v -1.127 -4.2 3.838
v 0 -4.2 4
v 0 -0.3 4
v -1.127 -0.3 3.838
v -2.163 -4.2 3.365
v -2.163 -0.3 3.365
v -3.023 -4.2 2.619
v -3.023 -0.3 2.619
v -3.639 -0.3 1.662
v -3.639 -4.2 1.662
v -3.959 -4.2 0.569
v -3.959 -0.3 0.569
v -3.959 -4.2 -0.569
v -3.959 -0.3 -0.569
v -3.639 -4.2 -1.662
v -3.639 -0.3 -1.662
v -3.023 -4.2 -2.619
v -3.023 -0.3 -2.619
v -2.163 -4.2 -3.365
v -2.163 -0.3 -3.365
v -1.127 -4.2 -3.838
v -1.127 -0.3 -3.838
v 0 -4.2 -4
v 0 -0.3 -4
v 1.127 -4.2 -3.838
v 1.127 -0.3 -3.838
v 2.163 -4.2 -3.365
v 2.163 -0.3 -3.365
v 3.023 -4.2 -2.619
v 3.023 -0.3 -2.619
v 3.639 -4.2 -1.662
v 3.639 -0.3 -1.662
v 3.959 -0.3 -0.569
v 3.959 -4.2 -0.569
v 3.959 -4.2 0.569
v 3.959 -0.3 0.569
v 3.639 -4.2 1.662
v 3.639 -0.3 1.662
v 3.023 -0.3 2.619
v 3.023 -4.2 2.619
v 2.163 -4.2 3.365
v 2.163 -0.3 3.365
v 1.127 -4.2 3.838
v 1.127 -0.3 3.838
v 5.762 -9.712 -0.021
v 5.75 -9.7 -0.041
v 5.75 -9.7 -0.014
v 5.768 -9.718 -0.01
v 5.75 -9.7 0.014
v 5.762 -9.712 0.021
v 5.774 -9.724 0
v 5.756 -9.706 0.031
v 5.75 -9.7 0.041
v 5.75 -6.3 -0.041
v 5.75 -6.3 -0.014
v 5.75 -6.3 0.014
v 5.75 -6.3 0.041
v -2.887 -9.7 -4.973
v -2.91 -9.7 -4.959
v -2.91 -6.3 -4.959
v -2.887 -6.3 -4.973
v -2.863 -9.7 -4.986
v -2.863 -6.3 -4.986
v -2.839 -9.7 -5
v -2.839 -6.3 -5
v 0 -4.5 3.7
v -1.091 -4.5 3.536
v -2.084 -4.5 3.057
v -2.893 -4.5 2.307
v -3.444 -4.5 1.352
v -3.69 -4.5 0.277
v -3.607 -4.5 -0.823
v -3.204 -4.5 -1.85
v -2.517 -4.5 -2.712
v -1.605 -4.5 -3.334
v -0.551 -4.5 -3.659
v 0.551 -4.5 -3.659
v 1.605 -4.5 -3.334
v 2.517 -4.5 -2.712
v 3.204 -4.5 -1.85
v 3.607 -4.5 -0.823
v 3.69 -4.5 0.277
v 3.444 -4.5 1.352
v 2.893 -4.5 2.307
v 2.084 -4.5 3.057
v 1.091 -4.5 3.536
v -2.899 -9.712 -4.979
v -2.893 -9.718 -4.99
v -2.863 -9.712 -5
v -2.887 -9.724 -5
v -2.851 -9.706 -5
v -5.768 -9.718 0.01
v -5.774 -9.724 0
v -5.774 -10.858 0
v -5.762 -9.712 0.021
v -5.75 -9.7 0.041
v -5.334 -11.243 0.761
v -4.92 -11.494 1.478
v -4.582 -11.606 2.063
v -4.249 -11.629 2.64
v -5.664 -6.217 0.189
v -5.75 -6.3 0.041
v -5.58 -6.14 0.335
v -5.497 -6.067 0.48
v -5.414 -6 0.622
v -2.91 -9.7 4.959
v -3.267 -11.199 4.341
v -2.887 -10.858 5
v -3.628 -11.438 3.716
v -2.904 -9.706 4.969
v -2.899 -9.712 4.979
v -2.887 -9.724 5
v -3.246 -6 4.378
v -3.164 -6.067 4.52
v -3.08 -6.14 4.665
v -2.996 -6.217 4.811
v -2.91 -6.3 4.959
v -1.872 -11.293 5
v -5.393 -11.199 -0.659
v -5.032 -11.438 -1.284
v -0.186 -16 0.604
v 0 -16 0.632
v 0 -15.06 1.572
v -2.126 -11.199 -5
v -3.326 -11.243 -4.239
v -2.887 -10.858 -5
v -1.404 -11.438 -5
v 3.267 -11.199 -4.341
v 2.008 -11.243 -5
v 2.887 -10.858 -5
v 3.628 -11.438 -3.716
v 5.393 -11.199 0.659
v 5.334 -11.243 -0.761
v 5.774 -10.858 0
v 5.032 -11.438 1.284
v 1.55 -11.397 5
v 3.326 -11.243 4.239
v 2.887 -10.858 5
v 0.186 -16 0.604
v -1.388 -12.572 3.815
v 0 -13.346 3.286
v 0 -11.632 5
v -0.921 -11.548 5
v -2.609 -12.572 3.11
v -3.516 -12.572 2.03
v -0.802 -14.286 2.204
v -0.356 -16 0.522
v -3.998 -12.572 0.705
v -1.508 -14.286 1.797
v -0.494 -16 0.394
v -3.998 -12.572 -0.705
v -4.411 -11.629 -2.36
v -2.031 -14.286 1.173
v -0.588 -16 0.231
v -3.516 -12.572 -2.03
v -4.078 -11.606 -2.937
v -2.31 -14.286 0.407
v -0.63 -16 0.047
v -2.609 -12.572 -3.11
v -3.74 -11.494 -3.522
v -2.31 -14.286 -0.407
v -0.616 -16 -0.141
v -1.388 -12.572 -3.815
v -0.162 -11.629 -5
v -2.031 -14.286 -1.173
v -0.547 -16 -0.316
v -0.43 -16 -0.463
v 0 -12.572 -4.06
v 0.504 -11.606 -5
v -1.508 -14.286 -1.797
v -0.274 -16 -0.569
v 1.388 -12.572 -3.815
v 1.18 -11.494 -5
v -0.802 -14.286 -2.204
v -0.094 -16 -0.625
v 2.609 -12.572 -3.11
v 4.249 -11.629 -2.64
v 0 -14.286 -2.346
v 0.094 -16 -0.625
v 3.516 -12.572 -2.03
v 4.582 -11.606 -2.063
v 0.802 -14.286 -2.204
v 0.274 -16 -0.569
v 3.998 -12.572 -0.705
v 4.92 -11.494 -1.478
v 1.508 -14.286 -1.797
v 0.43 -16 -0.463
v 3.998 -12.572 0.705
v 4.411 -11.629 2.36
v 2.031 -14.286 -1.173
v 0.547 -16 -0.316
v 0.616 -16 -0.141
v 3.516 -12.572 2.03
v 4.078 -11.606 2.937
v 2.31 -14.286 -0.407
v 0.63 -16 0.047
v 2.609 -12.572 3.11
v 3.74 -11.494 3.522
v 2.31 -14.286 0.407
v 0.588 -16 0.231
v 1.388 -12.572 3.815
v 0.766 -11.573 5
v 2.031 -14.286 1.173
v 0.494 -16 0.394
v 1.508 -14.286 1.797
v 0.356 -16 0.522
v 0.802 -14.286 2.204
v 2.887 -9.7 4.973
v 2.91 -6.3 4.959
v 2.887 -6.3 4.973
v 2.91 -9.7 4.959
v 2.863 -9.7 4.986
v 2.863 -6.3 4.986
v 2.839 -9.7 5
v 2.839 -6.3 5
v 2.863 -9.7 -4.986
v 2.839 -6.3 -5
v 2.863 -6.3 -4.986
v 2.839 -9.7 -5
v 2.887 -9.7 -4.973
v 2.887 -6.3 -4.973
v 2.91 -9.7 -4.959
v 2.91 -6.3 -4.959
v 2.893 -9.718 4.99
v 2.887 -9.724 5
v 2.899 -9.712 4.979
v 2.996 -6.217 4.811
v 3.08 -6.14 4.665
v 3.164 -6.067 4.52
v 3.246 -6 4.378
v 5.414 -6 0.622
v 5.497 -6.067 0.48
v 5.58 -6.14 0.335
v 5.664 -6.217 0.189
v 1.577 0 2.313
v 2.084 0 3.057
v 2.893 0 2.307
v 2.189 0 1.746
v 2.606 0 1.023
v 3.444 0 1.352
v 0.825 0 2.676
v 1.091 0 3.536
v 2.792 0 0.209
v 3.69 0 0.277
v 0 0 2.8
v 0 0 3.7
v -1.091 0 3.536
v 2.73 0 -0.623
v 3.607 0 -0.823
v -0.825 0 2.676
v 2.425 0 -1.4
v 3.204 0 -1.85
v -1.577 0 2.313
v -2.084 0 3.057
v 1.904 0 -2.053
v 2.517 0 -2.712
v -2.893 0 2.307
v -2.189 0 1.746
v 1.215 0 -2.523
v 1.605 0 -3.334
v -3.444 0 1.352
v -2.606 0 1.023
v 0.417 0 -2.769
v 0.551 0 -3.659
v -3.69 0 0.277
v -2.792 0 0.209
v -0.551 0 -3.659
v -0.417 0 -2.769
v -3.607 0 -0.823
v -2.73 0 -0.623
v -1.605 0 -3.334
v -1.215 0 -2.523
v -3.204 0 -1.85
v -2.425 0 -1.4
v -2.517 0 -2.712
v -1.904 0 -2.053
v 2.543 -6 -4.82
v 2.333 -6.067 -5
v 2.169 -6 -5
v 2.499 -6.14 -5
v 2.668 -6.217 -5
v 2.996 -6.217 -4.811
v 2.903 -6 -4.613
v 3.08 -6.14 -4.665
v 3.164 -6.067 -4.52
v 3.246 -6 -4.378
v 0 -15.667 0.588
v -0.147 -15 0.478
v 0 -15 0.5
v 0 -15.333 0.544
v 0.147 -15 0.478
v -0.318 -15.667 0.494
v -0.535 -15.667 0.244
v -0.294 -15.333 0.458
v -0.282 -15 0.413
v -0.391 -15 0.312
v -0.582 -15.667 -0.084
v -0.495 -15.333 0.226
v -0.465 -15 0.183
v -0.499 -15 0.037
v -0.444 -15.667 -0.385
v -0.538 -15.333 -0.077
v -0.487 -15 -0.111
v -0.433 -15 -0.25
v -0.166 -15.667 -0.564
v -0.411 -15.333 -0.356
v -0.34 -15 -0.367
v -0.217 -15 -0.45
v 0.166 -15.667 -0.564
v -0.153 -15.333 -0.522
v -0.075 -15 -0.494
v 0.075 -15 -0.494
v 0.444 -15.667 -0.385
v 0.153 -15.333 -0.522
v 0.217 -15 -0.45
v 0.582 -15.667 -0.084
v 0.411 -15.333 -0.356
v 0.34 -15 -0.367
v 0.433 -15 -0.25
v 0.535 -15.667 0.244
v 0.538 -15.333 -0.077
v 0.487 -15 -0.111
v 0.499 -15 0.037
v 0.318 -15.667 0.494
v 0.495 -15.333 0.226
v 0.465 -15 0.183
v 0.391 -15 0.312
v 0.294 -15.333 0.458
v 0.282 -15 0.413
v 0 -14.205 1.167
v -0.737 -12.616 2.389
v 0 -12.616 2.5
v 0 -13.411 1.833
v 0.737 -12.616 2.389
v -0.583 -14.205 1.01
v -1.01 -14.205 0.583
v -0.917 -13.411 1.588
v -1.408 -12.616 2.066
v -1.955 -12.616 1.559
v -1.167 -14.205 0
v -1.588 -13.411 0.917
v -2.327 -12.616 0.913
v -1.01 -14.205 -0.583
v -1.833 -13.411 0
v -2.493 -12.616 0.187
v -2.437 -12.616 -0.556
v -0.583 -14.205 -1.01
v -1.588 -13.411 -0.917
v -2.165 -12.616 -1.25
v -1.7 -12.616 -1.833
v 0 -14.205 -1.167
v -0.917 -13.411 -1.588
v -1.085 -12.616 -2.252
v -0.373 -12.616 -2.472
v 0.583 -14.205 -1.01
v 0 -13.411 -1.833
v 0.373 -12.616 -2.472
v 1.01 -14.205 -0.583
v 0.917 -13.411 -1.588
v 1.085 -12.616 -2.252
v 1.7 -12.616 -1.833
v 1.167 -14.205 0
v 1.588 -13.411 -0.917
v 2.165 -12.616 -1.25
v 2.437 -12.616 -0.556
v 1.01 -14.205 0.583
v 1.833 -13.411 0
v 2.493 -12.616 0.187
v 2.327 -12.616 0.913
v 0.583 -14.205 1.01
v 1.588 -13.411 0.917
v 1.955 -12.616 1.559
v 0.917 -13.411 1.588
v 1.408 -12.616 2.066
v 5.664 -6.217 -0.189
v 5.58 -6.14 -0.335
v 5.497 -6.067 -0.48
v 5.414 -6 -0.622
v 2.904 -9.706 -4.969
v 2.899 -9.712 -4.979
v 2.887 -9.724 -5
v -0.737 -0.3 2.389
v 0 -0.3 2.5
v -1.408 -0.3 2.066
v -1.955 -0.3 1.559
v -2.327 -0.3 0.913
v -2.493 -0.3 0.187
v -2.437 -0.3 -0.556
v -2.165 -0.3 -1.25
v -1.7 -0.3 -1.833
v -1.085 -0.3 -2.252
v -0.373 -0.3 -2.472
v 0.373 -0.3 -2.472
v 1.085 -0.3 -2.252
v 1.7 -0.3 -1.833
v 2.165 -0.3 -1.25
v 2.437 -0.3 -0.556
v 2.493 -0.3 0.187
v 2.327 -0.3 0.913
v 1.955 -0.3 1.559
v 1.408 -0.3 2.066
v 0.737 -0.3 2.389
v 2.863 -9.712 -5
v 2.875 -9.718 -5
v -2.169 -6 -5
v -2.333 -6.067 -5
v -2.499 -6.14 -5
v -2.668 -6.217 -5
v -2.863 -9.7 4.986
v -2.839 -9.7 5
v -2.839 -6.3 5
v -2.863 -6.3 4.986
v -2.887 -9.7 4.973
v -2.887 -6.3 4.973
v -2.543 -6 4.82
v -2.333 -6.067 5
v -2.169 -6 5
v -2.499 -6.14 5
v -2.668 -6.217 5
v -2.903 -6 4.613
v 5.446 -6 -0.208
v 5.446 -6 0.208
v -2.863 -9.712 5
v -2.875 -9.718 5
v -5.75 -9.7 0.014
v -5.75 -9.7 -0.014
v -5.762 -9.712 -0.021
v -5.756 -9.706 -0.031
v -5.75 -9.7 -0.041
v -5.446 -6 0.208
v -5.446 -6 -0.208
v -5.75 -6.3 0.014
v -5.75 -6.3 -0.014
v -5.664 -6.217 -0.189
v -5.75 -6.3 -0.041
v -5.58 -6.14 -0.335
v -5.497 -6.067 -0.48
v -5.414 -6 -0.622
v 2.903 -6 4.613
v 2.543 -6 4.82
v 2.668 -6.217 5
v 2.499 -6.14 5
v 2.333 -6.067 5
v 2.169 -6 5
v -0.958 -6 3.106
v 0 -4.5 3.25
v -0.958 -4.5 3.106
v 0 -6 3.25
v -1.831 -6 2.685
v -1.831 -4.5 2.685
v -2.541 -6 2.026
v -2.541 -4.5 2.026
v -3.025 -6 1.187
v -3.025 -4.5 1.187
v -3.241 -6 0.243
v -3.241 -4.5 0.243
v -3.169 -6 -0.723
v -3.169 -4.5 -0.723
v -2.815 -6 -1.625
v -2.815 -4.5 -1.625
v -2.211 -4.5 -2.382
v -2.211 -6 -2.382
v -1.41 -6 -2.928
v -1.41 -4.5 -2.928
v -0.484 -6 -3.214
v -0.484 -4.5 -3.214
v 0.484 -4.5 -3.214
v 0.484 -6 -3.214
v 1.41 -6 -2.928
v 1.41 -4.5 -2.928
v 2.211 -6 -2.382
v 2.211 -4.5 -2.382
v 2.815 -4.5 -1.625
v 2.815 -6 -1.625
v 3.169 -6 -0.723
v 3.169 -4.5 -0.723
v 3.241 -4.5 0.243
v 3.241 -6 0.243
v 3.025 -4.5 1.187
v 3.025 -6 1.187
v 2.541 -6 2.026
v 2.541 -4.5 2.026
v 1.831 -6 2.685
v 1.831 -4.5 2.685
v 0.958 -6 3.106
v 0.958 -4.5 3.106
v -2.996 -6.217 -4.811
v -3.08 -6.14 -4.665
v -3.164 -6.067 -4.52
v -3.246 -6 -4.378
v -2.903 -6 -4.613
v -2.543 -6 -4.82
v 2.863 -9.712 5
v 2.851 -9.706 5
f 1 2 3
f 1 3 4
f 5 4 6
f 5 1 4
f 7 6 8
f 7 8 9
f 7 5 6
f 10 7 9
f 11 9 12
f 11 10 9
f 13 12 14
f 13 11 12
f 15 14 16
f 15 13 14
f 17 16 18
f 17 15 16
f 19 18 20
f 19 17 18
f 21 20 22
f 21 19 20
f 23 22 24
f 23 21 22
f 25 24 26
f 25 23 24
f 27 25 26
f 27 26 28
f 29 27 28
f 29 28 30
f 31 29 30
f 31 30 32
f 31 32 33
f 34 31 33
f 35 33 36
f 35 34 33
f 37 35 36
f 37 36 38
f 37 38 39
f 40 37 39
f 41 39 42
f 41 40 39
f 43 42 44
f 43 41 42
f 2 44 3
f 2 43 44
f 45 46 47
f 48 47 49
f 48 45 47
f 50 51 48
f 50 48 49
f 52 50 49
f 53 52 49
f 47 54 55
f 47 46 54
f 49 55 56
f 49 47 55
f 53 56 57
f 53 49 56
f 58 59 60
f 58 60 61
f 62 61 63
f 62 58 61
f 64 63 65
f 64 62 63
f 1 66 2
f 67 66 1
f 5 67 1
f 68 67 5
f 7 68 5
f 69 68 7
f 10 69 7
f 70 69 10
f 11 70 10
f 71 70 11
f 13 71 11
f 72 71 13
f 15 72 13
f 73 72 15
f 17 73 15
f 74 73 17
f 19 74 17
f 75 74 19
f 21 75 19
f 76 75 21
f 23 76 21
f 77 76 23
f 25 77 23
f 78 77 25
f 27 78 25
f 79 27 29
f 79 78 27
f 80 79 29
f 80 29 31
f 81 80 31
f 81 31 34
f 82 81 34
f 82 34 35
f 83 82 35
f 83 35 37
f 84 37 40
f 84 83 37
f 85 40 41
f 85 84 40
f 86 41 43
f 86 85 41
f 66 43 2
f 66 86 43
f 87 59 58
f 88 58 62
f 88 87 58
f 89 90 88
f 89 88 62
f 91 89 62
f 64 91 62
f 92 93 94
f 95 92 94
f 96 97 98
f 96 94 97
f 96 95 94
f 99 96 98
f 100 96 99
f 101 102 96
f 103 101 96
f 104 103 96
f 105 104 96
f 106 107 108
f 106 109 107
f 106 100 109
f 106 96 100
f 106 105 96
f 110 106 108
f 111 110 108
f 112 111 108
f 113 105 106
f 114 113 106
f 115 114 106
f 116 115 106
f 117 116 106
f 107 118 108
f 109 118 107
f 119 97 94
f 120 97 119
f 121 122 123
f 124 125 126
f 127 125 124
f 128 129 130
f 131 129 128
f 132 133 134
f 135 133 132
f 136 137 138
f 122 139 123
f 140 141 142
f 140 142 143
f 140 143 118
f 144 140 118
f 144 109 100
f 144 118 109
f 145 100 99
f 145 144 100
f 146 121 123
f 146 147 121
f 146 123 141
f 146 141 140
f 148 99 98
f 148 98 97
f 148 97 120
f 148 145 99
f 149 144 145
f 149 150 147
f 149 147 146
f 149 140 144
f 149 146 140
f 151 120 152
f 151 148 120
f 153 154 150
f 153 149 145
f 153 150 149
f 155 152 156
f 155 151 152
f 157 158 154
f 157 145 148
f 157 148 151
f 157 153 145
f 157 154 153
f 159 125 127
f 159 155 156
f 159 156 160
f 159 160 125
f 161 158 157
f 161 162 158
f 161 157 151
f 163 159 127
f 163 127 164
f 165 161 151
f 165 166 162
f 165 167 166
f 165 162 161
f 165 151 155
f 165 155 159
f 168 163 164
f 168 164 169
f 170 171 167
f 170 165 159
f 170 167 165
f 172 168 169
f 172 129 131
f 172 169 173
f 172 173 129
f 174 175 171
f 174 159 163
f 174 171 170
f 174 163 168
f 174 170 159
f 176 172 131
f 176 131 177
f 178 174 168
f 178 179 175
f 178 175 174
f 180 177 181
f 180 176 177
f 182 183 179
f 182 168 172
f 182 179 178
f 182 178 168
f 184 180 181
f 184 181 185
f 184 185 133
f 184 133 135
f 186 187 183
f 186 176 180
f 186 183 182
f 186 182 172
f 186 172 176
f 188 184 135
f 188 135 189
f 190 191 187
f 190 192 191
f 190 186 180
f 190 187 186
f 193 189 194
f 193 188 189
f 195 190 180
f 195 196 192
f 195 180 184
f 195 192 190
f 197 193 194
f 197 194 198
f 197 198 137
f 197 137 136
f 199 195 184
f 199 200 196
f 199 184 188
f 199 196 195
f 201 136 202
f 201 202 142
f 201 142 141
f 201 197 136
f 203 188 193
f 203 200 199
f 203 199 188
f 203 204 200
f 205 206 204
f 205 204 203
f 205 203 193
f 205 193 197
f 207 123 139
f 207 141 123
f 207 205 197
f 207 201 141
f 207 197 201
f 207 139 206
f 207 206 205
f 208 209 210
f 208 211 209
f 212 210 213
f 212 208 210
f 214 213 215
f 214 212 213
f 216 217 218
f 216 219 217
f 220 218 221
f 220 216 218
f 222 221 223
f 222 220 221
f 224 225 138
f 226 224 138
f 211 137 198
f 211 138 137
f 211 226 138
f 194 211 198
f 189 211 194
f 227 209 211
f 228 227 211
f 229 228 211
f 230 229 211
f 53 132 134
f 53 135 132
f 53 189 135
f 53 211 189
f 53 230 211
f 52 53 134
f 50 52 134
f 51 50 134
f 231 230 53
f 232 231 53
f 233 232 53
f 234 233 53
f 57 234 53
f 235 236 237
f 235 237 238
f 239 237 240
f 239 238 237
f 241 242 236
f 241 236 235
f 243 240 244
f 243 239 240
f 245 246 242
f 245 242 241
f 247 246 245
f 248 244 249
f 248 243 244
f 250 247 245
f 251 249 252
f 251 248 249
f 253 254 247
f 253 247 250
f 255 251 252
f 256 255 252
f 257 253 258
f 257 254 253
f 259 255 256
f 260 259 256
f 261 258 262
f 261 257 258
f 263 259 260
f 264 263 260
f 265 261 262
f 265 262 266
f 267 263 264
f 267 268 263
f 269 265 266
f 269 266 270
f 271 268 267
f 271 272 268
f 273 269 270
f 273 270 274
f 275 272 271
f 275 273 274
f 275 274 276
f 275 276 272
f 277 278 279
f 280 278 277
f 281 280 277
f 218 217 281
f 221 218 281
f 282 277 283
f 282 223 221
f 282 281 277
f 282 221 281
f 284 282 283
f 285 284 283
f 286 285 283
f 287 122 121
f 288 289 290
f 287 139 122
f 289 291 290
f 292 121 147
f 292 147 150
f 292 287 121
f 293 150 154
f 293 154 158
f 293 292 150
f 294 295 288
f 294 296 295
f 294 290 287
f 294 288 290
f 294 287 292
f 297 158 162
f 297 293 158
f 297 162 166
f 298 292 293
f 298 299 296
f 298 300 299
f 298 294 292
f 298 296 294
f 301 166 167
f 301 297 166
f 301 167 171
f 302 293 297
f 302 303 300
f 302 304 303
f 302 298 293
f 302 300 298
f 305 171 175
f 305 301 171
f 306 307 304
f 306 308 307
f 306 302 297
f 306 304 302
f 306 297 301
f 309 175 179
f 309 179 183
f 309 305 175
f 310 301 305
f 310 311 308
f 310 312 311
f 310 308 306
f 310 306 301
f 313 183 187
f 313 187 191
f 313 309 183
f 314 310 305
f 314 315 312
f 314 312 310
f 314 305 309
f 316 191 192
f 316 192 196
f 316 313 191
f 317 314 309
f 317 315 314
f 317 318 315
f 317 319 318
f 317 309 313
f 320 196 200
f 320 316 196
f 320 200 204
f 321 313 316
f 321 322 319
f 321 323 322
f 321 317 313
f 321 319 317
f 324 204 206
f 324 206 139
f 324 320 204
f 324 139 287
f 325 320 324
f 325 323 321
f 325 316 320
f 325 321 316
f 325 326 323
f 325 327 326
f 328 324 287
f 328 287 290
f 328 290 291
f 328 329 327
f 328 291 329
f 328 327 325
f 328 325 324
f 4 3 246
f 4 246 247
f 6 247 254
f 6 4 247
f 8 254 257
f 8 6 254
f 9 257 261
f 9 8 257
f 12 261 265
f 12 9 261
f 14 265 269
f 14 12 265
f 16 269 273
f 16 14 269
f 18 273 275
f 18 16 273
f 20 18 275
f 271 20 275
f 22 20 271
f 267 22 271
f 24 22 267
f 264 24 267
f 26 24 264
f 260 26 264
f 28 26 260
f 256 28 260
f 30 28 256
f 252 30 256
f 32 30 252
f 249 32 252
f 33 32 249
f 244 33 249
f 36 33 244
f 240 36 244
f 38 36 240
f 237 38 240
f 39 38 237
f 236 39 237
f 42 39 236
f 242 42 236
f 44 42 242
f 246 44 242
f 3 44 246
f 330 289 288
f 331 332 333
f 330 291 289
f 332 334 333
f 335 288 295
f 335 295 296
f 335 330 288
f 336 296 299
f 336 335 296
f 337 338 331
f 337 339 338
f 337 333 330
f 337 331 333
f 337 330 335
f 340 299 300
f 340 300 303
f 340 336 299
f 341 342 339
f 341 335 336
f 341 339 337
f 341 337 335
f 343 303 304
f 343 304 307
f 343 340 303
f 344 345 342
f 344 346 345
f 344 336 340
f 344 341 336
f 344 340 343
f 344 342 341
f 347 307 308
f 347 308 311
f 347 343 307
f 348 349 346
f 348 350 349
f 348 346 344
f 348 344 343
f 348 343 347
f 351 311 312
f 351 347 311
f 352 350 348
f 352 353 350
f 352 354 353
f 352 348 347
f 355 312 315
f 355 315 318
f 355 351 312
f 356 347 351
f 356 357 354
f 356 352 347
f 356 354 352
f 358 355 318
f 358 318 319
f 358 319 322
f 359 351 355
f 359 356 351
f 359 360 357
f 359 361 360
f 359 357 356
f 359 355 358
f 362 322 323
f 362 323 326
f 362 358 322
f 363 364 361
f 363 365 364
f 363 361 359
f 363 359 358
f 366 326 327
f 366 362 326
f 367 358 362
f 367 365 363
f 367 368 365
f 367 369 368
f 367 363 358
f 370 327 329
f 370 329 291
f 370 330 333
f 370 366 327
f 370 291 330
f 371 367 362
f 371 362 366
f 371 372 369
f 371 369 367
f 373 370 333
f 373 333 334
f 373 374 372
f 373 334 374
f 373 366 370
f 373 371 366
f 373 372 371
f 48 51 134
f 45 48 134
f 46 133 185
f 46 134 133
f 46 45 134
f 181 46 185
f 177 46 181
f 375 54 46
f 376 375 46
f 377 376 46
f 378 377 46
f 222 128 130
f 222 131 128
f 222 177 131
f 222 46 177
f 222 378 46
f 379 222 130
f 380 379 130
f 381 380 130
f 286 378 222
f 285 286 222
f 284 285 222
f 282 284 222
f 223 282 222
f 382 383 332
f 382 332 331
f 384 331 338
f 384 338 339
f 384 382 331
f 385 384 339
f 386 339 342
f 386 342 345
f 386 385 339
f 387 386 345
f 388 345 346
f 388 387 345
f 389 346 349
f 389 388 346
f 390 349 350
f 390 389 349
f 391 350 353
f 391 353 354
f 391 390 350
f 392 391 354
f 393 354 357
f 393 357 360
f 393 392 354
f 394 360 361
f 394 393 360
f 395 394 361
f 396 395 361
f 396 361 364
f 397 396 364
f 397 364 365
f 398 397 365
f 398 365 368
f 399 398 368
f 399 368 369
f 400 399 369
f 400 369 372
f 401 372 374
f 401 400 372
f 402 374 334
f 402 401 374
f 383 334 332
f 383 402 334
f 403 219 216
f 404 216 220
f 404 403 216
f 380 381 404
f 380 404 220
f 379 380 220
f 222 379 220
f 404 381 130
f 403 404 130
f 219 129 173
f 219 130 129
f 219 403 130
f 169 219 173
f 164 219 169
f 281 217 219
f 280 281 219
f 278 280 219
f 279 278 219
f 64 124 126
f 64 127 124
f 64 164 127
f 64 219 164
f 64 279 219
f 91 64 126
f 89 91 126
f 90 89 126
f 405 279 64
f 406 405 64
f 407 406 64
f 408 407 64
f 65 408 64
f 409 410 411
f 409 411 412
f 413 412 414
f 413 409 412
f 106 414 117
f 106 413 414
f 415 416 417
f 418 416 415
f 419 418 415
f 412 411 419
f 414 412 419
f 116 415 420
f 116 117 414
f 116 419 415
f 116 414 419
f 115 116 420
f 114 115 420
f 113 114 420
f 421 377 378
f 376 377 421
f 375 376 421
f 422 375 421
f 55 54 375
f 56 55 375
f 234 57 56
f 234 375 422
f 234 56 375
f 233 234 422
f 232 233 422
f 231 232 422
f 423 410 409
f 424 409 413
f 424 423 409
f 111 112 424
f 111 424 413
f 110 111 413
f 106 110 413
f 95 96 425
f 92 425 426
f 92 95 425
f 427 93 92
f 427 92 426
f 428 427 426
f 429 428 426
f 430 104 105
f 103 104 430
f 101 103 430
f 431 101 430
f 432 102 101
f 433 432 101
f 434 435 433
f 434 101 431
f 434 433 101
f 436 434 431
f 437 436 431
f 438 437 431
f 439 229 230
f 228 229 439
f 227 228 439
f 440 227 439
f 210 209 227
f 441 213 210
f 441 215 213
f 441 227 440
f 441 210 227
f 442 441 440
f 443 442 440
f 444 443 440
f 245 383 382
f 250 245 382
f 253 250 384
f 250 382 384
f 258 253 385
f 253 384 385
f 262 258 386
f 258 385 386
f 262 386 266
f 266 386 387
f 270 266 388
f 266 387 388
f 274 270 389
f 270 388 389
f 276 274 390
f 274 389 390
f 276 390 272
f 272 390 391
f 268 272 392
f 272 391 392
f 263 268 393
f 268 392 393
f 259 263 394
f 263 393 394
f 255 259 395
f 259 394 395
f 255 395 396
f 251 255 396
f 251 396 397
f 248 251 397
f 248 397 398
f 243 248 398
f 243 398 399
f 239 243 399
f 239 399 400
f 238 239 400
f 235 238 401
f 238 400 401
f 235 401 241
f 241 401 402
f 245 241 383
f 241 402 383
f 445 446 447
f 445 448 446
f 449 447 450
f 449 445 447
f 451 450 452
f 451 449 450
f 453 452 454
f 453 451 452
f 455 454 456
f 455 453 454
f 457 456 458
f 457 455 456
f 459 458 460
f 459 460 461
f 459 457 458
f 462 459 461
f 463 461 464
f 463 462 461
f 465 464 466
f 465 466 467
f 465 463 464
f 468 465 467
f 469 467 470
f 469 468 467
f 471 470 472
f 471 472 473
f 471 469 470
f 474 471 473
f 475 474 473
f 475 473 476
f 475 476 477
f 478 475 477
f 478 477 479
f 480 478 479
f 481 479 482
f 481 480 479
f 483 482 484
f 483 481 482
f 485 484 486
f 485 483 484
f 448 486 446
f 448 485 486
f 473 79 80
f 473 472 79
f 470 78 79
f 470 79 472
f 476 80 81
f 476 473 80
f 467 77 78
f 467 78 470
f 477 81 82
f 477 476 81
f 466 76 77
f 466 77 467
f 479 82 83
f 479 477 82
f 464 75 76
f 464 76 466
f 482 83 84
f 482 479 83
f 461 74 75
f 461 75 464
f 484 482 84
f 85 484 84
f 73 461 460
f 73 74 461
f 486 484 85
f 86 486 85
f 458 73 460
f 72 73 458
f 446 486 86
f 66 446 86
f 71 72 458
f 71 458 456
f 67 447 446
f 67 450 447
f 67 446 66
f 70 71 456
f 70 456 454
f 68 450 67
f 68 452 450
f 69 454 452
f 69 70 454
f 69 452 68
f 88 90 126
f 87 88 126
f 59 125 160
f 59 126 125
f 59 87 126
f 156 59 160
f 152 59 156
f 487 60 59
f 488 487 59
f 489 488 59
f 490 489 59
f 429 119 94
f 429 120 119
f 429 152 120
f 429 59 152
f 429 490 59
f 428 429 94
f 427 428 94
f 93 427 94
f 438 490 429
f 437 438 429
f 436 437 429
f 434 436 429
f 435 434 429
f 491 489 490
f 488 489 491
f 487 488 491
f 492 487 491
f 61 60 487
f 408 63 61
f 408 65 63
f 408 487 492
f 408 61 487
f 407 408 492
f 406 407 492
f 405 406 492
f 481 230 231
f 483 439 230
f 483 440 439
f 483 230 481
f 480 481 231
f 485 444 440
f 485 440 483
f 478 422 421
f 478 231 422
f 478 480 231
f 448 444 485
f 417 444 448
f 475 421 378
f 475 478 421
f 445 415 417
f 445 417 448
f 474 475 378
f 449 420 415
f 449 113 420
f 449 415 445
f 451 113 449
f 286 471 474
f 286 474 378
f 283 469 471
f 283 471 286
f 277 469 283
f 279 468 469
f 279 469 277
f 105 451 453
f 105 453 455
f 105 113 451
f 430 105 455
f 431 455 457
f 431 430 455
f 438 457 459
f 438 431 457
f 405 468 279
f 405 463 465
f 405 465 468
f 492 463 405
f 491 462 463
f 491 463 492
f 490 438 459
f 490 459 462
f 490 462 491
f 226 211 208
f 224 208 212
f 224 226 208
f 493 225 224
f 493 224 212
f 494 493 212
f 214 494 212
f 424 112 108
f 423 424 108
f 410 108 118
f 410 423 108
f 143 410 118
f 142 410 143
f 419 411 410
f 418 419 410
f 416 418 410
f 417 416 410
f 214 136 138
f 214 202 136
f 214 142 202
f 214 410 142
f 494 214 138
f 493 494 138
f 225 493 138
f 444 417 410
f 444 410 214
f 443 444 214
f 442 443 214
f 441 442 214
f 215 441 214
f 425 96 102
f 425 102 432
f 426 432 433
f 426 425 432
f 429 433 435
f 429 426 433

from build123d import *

# Parameters (mm, degrees)
CHAMFER_1_SIZE      = 0.3
SKETCH_2_OUTSIDE_W  = 20.194
SKETCH_2_OUTSIDE_H  = 20.194
CUT_EXTRUDE_1_DEPTH = 14.709764028


with BuildPart() as part:
    # Эскиз1 → Повернуть1 (revolve)
    with BuildSketch(Plane.XY):
        Polygon((2.5, 0), (4, 0), (4, -4.5), (3.25, -4.5), (3.25, -6), (5.75, -6), (5.75, -10), (6.631652498, -10), (0.631652498, -16), (0.5, -15), (2.5, -12.616492815), align=None)
    revolve(axis=Axis((0, 8.266911596, 0), (0, -1, 0)))

    # Фаска1
    chamfer_1_edges = [part.edges().sort_by_distance(p)[0] for p in [
        (-5.75, -10, 0),
        (-5.75, -6, 0),
        (-4, -4.5, 0),
        (-2.5, 0, 0),
        (-4, 0, 0),
    ]]
    chamfer(chamfer_1_edges, length=CHAMFER_1_SIZE)

    # Эскиз2 outside → Вырез-Вытянуть1 (cut, through all)
    with BuildSketch(Plane(origin=(0, -6, 0), x_dir=(1, 0, 0), z_dir=(0, 1, 0))):
        Rectangle(SKETCH_2_OUTSIDE_W, SKETCH_2_OUTSIDE_H)
        Polygon((5.773502692, 0), (2.886751346, 5), (-2.886751346, 5), (-5.773502692, 0), (-2.886751346, -5), (2.886751346, -5), align=None, mode=Mode.SUBTRACT)
    extrude(amount=-CUT_EXTRUDE_1_DEPTH, mode=Mode.SUBTRACT)


solid = part.part
